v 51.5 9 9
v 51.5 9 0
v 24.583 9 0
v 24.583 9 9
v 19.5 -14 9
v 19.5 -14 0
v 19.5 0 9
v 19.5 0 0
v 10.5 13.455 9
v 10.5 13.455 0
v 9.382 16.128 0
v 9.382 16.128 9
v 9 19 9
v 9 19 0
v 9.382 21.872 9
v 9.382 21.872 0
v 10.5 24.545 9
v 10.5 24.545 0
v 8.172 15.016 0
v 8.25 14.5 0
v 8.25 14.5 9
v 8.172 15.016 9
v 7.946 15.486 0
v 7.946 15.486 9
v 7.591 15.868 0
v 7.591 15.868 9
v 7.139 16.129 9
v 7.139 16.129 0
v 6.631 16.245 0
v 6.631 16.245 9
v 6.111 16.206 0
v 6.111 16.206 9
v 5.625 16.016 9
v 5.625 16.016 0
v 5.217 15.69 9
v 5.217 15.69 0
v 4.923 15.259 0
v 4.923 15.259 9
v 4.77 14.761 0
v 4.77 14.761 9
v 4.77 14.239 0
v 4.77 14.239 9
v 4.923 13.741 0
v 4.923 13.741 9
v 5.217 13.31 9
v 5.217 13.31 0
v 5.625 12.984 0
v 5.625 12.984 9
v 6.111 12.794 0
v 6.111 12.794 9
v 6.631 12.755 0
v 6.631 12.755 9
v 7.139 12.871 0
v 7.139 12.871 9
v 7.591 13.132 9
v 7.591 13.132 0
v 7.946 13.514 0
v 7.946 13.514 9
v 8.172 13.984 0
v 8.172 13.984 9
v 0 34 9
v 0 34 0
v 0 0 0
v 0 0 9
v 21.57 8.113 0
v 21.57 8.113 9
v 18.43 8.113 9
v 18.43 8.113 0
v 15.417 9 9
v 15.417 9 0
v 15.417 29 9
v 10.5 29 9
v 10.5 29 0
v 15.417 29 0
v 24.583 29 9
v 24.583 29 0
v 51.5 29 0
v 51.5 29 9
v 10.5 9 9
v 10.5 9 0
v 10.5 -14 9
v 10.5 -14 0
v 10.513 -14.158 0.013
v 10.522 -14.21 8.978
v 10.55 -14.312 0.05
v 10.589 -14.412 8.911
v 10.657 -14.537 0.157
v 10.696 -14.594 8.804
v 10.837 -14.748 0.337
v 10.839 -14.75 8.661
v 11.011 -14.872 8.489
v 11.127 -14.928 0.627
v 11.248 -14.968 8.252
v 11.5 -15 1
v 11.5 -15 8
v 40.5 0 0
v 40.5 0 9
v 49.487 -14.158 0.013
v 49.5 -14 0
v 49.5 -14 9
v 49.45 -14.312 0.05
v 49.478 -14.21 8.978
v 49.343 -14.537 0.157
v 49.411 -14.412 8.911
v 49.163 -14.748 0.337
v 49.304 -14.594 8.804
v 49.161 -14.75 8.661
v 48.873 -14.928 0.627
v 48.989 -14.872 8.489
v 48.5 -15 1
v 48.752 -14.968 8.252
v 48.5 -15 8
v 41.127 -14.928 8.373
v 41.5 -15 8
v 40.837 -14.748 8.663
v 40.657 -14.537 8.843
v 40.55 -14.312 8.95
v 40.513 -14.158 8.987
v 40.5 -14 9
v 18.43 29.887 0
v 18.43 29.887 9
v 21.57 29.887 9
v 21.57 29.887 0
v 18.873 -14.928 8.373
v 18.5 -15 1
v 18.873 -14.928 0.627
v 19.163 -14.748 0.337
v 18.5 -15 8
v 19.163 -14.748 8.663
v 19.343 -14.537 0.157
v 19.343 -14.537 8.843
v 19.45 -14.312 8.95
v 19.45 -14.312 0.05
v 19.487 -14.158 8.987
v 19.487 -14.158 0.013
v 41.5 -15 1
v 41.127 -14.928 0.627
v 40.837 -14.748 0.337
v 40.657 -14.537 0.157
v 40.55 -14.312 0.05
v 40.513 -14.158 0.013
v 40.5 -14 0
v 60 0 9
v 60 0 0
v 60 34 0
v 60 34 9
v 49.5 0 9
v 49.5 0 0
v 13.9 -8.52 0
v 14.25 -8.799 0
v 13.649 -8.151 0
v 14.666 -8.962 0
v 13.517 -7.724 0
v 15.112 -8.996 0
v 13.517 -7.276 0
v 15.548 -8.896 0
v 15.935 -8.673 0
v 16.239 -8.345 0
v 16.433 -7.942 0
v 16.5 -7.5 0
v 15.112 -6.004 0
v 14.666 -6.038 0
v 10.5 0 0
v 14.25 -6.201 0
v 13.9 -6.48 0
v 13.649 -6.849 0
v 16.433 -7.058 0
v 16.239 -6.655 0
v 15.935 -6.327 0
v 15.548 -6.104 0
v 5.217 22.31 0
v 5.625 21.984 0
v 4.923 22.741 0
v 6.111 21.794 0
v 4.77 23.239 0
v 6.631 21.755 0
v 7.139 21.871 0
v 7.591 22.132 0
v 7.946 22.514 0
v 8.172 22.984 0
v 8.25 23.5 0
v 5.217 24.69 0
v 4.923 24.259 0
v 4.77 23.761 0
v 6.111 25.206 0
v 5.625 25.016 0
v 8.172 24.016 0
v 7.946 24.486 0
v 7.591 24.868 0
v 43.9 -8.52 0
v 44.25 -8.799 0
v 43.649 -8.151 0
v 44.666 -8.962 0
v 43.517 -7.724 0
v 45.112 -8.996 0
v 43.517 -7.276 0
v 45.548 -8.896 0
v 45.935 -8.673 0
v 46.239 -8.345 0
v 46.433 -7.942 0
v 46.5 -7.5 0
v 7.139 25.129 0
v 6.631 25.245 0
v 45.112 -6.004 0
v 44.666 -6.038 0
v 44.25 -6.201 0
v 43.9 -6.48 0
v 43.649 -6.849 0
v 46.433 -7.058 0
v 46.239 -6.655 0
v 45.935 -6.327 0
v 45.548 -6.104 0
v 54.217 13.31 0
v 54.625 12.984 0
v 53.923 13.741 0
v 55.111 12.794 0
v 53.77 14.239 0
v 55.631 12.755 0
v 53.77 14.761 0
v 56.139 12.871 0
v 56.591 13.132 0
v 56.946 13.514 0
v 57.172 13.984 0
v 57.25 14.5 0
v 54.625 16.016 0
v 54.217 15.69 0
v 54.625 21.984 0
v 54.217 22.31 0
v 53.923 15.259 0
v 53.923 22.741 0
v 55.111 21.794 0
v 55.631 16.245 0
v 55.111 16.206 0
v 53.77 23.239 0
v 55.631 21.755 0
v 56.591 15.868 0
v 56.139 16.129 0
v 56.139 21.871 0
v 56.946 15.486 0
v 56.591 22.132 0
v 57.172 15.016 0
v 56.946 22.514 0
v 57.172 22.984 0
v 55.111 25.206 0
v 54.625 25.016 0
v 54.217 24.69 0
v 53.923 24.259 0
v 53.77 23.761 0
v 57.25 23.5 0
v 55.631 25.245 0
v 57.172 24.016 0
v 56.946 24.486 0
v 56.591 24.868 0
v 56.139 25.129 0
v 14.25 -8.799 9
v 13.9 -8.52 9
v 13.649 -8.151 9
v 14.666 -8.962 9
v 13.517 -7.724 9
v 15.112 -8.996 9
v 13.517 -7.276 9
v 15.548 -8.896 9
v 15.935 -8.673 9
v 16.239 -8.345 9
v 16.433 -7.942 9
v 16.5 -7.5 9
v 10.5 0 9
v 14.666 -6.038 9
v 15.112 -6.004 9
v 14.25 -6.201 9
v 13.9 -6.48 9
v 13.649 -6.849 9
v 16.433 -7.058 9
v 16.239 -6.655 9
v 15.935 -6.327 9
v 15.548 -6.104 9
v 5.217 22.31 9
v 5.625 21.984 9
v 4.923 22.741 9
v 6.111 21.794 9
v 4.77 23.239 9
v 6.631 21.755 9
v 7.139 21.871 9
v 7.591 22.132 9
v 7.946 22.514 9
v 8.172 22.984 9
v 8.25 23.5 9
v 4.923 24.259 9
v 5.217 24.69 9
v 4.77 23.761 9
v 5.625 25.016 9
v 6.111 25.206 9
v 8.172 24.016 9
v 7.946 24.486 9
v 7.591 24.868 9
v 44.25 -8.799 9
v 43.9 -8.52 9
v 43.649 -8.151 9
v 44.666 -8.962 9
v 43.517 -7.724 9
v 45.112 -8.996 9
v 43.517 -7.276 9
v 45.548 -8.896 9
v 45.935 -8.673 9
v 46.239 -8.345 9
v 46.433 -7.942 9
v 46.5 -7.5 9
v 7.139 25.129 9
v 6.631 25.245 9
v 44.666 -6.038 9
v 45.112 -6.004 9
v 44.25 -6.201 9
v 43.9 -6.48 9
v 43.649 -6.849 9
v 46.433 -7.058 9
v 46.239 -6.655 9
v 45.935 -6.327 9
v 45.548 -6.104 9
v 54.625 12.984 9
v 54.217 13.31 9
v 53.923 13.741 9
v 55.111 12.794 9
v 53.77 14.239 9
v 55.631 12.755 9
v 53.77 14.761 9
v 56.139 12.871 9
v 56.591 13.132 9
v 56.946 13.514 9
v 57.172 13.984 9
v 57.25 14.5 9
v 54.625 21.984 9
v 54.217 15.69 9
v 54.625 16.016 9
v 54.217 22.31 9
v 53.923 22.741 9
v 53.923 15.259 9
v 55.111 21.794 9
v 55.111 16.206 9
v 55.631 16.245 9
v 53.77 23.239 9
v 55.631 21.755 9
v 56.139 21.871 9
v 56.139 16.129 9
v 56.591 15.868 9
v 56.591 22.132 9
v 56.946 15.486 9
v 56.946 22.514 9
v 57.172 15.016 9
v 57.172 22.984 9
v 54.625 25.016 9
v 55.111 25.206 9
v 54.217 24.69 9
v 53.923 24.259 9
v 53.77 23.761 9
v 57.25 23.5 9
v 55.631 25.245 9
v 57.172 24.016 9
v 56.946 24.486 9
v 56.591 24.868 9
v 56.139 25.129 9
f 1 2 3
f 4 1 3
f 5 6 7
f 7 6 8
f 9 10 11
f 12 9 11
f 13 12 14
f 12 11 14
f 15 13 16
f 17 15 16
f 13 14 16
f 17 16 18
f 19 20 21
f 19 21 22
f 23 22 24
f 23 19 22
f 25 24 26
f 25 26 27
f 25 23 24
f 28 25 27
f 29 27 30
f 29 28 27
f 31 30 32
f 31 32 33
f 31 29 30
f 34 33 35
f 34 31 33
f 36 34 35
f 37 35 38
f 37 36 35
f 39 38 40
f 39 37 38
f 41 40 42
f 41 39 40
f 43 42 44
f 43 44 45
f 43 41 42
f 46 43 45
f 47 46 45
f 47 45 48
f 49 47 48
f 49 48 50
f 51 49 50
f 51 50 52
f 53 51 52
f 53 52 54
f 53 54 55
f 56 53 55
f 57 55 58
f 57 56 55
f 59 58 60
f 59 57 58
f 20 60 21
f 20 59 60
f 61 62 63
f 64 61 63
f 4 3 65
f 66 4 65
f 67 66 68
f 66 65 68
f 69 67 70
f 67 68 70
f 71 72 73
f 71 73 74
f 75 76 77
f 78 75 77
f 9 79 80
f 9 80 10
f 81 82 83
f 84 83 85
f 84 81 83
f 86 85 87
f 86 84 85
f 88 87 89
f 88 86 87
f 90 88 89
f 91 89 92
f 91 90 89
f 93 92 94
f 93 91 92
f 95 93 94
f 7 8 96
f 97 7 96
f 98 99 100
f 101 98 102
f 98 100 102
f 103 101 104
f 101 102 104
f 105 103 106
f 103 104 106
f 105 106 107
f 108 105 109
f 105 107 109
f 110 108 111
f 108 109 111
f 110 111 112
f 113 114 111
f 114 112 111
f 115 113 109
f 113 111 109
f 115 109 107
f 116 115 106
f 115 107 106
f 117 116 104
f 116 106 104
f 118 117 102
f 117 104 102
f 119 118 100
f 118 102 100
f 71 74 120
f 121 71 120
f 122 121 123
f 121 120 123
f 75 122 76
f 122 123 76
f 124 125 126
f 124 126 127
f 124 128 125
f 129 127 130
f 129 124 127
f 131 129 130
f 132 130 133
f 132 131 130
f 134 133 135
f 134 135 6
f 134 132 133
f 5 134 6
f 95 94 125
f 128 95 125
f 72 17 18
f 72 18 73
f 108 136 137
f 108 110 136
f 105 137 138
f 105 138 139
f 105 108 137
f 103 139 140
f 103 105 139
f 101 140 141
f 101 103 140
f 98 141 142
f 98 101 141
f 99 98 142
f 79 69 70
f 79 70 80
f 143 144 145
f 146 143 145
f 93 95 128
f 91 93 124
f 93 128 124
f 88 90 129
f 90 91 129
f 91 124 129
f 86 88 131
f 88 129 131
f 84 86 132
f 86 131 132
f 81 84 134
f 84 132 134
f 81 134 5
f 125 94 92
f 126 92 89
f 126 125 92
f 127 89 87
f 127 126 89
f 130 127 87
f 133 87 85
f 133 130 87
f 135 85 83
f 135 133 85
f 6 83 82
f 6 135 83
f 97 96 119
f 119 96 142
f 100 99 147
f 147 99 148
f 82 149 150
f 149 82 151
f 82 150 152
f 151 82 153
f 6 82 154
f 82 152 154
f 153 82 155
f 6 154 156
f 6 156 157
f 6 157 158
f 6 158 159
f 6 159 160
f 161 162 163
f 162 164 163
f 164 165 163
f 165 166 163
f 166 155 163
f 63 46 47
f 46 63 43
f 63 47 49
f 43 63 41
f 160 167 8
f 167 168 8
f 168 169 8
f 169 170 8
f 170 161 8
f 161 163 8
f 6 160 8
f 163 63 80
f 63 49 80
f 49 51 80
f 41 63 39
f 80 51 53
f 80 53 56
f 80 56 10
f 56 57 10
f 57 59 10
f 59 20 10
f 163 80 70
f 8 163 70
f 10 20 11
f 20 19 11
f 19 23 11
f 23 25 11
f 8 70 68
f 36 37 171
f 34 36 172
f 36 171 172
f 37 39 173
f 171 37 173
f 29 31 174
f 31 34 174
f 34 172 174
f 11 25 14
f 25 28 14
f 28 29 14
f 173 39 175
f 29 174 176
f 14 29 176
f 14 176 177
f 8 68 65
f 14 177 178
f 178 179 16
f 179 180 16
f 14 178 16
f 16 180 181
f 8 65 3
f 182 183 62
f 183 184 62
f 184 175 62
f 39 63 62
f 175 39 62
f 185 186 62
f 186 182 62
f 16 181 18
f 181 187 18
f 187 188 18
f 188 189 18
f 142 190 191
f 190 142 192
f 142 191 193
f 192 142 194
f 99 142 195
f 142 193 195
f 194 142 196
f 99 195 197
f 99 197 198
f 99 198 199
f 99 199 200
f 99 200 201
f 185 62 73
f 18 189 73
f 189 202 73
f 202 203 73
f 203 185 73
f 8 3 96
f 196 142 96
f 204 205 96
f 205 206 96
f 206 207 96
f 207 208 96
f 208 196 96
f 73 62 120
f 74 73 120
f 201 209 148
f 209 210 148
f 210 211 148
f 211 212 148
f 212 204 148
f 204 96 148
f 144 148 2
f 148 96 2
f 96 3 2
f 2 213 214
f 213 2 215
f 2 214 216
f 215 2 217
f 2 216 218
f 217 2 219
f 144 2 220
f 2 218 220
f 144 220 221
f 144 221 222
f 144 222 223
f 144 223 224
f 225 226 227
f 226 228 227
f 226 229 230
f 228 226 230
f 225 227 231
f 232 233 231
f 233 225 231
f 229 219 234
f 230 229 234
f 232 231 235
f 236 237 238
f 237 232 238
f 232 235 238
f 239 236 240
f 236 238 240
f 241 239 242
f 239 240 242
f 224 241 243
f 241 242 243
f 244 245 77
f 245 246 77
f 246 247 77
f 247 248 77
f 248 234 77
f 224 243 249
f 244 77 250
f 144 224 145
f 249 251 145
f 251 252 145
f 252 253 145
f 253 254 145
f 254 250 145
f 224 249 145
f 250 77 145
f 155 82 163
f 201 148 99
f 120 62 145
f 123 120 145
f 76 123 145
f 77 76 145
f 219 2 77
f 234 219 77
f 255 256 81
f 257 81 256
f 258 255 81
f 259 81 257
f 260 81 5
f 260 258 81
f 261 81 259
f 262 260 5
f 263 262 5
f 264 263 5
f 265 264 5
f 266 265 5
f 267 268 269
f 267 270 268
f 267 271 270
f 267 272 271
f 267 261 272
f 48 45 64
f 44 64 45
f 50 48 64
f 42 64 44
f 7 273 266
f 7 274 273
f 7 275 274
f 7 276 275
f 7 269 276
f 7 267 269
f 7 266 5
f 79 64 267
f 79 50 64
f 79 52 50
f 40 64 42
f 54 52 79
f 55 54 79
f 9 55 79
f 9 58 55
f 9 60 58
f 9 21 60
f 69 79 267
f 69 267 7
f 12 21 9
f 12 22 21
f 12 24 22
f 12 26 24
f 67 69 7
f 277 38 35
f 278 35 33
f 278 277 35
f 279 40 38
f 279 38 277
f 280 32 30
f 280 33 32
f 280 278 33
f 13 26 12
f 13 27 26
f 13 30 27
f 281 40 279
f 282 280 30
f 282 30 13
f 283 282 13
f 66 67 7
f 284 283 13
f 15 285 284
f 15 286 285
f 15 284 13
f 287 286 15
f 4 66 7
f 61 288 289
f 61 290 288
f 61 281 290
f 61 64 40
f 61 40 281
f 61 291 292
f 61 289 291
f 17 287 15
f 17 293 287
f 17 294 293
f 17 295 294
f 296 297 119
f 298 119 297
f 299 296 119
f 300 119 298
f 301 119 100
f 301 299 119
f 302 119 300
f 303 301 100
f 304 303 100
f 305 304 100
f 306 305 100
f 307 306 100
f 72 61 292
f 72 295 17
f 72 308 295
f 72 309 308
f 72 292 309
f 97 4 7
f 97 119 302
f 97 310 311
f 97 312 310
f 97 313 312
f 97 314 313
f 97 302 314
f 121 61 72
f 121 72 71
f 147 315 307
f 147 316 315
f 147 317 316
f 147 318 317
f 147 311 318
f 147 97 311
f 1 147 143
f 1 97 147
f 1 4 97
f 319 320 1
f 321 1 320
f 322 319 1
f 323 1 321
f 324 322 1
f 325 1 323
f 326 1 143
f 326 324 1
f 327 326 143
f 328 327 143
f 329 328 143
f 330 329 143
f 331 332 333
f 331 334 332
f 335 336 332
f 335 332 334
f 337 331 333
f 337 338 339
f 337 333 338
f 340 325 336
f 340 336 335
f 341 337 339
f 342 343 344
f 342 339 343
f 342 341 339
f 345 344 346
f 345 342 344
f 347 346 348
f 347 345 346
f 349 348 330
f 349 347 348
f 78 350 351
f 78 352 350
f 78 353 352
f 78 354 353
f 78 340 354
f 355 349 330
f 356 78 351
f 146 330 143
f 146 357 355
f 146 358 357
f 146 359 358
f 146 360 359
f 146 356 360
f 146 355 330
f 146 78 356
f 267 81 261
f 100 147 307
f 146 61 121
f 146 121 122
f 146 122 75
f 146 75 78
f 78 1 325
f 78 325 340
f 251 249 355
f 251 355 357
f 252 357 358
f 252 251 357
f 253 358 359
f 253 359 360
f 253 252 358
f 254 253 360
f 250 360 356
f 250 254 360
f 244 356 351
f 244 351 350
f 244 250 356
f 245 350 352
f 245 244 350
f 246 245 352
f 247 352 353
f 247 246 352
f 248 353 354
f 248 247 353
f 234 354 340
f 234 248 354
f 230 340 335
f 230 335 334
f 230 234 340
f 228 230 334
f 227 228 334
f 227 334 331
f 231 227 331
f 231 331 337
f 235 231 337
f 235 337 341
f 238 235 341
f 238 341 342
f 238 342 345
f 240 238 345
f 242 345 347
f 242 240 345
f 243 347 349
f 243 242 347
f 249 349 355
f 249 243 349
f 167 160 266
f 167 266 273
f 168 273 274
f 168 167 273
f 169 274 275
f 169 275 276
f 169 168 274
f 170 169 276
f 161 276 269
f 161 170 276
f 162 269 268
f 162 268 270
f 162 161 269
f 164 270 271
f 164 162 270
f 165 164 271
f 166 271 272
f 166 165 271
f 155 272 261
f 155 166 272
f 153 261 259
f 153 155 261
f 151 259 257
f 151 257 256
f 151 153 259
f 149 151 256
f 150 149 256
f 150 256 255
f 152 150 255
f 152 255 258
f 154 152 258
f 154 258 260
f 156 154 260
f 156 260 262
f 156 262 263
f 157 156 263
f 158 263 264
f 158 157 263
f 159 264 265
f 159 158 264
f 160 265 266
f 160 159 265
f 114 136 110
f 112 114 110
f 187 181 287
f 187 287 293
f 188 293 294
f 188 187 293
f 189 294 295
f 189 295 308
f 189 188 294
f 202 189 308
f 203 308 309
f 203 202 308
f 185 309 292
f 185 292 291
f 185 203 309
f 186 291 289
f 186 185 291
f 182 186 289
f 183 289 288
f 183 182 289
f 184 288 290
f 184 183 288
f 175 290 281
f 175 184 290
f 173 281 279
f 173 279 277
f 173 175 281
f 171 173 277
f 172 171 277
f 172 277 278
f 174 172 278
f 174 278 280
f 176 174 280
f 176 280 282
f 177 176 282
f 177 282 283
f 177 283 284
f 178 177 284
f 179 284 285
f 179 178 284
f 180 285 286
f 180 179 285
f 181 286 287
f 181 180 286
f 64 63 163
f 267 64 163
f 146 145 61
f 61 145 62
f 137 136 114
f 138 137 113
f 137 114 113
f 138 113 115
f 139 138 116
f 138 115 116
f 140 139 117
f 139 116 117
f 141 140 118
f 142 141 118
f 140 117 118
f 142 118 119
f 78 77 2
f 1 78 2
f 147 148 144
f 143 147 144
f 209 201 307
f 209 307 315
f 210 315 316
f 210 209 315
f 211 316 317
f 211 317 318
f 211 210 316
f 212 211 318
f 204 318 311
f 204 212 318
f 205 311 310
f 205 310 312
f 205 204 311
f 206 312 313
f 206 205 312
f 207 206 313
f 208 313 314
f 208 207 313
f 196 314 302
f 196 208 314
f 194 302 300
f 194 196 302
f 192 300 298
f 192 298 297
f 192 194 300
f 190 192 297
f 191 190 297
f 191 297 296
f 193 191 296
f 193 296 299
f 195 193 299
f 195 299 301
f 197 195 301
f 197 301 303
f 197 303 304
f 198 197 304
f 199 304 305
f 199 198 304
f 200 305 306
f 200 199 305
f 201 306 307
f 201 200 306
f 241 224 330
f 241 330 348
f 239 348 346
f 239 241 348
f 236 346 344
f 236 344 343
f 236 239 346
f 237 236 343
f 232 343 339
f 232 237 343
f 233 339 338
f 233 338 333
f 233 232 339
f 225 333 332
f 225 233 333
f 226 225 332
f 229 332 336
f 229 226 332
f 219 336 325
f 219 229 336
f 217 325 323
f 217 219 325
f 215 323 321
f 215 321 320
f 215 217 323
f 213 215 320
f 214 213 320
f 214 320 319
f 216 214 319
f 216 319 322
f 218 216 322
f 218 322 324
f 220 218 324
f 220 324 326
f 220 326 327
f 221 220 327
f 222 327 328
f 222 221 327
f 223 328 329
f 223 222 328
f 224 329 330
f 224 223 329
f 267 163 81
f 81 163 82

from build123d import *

# Parameters (mm, degrees)
CROQUIS1_R              = 1.75
CROQUIS1_R_2            = 1.5
SALIENTE_EXTRUIR1_DEPTH = 9
REDONDEO1_R             = 1


with BuildPart() as part:
    # Croquis1 → Saliente-Extruir1 (new body)
    with BuildSketch(Plane.XY):
        Polygon((0, 34), (0, 0), (10.5, 0), (10.5, -15), (19.5, -15), (19.5, 0), (40.5, 0), (40.5, -15), (49.5, -15), (49.5, 0), (60, 0), (60, 34), align=None)
        with Locations((6.5, 14.5)):
            Circle(CROQUIS1_R, mode=Mode.SUBTRACT)
        with Locations((6.5, 23.5)):
            Circle(CROQUIS1_R, mode=Mode.SUBTRACT)
        with BuildLine():
            Line((10.5, 24.545268253), (10.5, 29))
            Line((10.5, 29), (15.417424305, 29))
            ThreePointArc((15.417424305, 29), (20, 30), (24.582575695, 29))
            Line((24.582575695, 29), (51.5, 29))
            Line((51.5, 29), (51.5, 9))
            Line((51.5, 9), (24.582575695, 9))
            ThreePointArc((24.582575695, 9), (20, 8), (15.417424305, 9))
            Line((15.417424305, 9), (10.5, 9))
            Line((10.5, 9), (10.5, 13.454731747))
            ThreePointArc((10.5, 13.454731747), (9, 19), (10.5, 24.545268253))
        make_face(mode=Mode.SUBTRACT)
        with Locations((55.5, 14.5)):
            Circle(CROQUIS1_R, mode=Mode.SUBTRACT)
        with Locations((55.5, 23.5)):
            Circle(CROQUIS1_R, mode=Mode.SUBTRACT)
        with Locations((15, -7.5)):
            Circle(CROQUIS1_R_2, mode=Mode.SUBTRACT)
        with Locations((45, -7.5)):
            Circle(CROQUIS1_R_2, mode=Mode.SUBTRACT)
    extrude(amount=SALIENTE_EXTRUIR1_DEPTH)

    # Redondeo1
    redondeo1_edges = [part.edges().sort_by_distance(p)[0] for p in [
        (45, -15, 0),
        (15, -15, 0),
        (49.5, -15, 4.5),
        (40.5, -15, 4.5),
        (19.5, -15, 4.5),
        (10.5, -15, 4.5),
        (15, -15, 9),
        (45, -15, 9),
    ]]
    fillet(redondeo1_edges, radius=REDONDEO1_R)


solid = part.part
